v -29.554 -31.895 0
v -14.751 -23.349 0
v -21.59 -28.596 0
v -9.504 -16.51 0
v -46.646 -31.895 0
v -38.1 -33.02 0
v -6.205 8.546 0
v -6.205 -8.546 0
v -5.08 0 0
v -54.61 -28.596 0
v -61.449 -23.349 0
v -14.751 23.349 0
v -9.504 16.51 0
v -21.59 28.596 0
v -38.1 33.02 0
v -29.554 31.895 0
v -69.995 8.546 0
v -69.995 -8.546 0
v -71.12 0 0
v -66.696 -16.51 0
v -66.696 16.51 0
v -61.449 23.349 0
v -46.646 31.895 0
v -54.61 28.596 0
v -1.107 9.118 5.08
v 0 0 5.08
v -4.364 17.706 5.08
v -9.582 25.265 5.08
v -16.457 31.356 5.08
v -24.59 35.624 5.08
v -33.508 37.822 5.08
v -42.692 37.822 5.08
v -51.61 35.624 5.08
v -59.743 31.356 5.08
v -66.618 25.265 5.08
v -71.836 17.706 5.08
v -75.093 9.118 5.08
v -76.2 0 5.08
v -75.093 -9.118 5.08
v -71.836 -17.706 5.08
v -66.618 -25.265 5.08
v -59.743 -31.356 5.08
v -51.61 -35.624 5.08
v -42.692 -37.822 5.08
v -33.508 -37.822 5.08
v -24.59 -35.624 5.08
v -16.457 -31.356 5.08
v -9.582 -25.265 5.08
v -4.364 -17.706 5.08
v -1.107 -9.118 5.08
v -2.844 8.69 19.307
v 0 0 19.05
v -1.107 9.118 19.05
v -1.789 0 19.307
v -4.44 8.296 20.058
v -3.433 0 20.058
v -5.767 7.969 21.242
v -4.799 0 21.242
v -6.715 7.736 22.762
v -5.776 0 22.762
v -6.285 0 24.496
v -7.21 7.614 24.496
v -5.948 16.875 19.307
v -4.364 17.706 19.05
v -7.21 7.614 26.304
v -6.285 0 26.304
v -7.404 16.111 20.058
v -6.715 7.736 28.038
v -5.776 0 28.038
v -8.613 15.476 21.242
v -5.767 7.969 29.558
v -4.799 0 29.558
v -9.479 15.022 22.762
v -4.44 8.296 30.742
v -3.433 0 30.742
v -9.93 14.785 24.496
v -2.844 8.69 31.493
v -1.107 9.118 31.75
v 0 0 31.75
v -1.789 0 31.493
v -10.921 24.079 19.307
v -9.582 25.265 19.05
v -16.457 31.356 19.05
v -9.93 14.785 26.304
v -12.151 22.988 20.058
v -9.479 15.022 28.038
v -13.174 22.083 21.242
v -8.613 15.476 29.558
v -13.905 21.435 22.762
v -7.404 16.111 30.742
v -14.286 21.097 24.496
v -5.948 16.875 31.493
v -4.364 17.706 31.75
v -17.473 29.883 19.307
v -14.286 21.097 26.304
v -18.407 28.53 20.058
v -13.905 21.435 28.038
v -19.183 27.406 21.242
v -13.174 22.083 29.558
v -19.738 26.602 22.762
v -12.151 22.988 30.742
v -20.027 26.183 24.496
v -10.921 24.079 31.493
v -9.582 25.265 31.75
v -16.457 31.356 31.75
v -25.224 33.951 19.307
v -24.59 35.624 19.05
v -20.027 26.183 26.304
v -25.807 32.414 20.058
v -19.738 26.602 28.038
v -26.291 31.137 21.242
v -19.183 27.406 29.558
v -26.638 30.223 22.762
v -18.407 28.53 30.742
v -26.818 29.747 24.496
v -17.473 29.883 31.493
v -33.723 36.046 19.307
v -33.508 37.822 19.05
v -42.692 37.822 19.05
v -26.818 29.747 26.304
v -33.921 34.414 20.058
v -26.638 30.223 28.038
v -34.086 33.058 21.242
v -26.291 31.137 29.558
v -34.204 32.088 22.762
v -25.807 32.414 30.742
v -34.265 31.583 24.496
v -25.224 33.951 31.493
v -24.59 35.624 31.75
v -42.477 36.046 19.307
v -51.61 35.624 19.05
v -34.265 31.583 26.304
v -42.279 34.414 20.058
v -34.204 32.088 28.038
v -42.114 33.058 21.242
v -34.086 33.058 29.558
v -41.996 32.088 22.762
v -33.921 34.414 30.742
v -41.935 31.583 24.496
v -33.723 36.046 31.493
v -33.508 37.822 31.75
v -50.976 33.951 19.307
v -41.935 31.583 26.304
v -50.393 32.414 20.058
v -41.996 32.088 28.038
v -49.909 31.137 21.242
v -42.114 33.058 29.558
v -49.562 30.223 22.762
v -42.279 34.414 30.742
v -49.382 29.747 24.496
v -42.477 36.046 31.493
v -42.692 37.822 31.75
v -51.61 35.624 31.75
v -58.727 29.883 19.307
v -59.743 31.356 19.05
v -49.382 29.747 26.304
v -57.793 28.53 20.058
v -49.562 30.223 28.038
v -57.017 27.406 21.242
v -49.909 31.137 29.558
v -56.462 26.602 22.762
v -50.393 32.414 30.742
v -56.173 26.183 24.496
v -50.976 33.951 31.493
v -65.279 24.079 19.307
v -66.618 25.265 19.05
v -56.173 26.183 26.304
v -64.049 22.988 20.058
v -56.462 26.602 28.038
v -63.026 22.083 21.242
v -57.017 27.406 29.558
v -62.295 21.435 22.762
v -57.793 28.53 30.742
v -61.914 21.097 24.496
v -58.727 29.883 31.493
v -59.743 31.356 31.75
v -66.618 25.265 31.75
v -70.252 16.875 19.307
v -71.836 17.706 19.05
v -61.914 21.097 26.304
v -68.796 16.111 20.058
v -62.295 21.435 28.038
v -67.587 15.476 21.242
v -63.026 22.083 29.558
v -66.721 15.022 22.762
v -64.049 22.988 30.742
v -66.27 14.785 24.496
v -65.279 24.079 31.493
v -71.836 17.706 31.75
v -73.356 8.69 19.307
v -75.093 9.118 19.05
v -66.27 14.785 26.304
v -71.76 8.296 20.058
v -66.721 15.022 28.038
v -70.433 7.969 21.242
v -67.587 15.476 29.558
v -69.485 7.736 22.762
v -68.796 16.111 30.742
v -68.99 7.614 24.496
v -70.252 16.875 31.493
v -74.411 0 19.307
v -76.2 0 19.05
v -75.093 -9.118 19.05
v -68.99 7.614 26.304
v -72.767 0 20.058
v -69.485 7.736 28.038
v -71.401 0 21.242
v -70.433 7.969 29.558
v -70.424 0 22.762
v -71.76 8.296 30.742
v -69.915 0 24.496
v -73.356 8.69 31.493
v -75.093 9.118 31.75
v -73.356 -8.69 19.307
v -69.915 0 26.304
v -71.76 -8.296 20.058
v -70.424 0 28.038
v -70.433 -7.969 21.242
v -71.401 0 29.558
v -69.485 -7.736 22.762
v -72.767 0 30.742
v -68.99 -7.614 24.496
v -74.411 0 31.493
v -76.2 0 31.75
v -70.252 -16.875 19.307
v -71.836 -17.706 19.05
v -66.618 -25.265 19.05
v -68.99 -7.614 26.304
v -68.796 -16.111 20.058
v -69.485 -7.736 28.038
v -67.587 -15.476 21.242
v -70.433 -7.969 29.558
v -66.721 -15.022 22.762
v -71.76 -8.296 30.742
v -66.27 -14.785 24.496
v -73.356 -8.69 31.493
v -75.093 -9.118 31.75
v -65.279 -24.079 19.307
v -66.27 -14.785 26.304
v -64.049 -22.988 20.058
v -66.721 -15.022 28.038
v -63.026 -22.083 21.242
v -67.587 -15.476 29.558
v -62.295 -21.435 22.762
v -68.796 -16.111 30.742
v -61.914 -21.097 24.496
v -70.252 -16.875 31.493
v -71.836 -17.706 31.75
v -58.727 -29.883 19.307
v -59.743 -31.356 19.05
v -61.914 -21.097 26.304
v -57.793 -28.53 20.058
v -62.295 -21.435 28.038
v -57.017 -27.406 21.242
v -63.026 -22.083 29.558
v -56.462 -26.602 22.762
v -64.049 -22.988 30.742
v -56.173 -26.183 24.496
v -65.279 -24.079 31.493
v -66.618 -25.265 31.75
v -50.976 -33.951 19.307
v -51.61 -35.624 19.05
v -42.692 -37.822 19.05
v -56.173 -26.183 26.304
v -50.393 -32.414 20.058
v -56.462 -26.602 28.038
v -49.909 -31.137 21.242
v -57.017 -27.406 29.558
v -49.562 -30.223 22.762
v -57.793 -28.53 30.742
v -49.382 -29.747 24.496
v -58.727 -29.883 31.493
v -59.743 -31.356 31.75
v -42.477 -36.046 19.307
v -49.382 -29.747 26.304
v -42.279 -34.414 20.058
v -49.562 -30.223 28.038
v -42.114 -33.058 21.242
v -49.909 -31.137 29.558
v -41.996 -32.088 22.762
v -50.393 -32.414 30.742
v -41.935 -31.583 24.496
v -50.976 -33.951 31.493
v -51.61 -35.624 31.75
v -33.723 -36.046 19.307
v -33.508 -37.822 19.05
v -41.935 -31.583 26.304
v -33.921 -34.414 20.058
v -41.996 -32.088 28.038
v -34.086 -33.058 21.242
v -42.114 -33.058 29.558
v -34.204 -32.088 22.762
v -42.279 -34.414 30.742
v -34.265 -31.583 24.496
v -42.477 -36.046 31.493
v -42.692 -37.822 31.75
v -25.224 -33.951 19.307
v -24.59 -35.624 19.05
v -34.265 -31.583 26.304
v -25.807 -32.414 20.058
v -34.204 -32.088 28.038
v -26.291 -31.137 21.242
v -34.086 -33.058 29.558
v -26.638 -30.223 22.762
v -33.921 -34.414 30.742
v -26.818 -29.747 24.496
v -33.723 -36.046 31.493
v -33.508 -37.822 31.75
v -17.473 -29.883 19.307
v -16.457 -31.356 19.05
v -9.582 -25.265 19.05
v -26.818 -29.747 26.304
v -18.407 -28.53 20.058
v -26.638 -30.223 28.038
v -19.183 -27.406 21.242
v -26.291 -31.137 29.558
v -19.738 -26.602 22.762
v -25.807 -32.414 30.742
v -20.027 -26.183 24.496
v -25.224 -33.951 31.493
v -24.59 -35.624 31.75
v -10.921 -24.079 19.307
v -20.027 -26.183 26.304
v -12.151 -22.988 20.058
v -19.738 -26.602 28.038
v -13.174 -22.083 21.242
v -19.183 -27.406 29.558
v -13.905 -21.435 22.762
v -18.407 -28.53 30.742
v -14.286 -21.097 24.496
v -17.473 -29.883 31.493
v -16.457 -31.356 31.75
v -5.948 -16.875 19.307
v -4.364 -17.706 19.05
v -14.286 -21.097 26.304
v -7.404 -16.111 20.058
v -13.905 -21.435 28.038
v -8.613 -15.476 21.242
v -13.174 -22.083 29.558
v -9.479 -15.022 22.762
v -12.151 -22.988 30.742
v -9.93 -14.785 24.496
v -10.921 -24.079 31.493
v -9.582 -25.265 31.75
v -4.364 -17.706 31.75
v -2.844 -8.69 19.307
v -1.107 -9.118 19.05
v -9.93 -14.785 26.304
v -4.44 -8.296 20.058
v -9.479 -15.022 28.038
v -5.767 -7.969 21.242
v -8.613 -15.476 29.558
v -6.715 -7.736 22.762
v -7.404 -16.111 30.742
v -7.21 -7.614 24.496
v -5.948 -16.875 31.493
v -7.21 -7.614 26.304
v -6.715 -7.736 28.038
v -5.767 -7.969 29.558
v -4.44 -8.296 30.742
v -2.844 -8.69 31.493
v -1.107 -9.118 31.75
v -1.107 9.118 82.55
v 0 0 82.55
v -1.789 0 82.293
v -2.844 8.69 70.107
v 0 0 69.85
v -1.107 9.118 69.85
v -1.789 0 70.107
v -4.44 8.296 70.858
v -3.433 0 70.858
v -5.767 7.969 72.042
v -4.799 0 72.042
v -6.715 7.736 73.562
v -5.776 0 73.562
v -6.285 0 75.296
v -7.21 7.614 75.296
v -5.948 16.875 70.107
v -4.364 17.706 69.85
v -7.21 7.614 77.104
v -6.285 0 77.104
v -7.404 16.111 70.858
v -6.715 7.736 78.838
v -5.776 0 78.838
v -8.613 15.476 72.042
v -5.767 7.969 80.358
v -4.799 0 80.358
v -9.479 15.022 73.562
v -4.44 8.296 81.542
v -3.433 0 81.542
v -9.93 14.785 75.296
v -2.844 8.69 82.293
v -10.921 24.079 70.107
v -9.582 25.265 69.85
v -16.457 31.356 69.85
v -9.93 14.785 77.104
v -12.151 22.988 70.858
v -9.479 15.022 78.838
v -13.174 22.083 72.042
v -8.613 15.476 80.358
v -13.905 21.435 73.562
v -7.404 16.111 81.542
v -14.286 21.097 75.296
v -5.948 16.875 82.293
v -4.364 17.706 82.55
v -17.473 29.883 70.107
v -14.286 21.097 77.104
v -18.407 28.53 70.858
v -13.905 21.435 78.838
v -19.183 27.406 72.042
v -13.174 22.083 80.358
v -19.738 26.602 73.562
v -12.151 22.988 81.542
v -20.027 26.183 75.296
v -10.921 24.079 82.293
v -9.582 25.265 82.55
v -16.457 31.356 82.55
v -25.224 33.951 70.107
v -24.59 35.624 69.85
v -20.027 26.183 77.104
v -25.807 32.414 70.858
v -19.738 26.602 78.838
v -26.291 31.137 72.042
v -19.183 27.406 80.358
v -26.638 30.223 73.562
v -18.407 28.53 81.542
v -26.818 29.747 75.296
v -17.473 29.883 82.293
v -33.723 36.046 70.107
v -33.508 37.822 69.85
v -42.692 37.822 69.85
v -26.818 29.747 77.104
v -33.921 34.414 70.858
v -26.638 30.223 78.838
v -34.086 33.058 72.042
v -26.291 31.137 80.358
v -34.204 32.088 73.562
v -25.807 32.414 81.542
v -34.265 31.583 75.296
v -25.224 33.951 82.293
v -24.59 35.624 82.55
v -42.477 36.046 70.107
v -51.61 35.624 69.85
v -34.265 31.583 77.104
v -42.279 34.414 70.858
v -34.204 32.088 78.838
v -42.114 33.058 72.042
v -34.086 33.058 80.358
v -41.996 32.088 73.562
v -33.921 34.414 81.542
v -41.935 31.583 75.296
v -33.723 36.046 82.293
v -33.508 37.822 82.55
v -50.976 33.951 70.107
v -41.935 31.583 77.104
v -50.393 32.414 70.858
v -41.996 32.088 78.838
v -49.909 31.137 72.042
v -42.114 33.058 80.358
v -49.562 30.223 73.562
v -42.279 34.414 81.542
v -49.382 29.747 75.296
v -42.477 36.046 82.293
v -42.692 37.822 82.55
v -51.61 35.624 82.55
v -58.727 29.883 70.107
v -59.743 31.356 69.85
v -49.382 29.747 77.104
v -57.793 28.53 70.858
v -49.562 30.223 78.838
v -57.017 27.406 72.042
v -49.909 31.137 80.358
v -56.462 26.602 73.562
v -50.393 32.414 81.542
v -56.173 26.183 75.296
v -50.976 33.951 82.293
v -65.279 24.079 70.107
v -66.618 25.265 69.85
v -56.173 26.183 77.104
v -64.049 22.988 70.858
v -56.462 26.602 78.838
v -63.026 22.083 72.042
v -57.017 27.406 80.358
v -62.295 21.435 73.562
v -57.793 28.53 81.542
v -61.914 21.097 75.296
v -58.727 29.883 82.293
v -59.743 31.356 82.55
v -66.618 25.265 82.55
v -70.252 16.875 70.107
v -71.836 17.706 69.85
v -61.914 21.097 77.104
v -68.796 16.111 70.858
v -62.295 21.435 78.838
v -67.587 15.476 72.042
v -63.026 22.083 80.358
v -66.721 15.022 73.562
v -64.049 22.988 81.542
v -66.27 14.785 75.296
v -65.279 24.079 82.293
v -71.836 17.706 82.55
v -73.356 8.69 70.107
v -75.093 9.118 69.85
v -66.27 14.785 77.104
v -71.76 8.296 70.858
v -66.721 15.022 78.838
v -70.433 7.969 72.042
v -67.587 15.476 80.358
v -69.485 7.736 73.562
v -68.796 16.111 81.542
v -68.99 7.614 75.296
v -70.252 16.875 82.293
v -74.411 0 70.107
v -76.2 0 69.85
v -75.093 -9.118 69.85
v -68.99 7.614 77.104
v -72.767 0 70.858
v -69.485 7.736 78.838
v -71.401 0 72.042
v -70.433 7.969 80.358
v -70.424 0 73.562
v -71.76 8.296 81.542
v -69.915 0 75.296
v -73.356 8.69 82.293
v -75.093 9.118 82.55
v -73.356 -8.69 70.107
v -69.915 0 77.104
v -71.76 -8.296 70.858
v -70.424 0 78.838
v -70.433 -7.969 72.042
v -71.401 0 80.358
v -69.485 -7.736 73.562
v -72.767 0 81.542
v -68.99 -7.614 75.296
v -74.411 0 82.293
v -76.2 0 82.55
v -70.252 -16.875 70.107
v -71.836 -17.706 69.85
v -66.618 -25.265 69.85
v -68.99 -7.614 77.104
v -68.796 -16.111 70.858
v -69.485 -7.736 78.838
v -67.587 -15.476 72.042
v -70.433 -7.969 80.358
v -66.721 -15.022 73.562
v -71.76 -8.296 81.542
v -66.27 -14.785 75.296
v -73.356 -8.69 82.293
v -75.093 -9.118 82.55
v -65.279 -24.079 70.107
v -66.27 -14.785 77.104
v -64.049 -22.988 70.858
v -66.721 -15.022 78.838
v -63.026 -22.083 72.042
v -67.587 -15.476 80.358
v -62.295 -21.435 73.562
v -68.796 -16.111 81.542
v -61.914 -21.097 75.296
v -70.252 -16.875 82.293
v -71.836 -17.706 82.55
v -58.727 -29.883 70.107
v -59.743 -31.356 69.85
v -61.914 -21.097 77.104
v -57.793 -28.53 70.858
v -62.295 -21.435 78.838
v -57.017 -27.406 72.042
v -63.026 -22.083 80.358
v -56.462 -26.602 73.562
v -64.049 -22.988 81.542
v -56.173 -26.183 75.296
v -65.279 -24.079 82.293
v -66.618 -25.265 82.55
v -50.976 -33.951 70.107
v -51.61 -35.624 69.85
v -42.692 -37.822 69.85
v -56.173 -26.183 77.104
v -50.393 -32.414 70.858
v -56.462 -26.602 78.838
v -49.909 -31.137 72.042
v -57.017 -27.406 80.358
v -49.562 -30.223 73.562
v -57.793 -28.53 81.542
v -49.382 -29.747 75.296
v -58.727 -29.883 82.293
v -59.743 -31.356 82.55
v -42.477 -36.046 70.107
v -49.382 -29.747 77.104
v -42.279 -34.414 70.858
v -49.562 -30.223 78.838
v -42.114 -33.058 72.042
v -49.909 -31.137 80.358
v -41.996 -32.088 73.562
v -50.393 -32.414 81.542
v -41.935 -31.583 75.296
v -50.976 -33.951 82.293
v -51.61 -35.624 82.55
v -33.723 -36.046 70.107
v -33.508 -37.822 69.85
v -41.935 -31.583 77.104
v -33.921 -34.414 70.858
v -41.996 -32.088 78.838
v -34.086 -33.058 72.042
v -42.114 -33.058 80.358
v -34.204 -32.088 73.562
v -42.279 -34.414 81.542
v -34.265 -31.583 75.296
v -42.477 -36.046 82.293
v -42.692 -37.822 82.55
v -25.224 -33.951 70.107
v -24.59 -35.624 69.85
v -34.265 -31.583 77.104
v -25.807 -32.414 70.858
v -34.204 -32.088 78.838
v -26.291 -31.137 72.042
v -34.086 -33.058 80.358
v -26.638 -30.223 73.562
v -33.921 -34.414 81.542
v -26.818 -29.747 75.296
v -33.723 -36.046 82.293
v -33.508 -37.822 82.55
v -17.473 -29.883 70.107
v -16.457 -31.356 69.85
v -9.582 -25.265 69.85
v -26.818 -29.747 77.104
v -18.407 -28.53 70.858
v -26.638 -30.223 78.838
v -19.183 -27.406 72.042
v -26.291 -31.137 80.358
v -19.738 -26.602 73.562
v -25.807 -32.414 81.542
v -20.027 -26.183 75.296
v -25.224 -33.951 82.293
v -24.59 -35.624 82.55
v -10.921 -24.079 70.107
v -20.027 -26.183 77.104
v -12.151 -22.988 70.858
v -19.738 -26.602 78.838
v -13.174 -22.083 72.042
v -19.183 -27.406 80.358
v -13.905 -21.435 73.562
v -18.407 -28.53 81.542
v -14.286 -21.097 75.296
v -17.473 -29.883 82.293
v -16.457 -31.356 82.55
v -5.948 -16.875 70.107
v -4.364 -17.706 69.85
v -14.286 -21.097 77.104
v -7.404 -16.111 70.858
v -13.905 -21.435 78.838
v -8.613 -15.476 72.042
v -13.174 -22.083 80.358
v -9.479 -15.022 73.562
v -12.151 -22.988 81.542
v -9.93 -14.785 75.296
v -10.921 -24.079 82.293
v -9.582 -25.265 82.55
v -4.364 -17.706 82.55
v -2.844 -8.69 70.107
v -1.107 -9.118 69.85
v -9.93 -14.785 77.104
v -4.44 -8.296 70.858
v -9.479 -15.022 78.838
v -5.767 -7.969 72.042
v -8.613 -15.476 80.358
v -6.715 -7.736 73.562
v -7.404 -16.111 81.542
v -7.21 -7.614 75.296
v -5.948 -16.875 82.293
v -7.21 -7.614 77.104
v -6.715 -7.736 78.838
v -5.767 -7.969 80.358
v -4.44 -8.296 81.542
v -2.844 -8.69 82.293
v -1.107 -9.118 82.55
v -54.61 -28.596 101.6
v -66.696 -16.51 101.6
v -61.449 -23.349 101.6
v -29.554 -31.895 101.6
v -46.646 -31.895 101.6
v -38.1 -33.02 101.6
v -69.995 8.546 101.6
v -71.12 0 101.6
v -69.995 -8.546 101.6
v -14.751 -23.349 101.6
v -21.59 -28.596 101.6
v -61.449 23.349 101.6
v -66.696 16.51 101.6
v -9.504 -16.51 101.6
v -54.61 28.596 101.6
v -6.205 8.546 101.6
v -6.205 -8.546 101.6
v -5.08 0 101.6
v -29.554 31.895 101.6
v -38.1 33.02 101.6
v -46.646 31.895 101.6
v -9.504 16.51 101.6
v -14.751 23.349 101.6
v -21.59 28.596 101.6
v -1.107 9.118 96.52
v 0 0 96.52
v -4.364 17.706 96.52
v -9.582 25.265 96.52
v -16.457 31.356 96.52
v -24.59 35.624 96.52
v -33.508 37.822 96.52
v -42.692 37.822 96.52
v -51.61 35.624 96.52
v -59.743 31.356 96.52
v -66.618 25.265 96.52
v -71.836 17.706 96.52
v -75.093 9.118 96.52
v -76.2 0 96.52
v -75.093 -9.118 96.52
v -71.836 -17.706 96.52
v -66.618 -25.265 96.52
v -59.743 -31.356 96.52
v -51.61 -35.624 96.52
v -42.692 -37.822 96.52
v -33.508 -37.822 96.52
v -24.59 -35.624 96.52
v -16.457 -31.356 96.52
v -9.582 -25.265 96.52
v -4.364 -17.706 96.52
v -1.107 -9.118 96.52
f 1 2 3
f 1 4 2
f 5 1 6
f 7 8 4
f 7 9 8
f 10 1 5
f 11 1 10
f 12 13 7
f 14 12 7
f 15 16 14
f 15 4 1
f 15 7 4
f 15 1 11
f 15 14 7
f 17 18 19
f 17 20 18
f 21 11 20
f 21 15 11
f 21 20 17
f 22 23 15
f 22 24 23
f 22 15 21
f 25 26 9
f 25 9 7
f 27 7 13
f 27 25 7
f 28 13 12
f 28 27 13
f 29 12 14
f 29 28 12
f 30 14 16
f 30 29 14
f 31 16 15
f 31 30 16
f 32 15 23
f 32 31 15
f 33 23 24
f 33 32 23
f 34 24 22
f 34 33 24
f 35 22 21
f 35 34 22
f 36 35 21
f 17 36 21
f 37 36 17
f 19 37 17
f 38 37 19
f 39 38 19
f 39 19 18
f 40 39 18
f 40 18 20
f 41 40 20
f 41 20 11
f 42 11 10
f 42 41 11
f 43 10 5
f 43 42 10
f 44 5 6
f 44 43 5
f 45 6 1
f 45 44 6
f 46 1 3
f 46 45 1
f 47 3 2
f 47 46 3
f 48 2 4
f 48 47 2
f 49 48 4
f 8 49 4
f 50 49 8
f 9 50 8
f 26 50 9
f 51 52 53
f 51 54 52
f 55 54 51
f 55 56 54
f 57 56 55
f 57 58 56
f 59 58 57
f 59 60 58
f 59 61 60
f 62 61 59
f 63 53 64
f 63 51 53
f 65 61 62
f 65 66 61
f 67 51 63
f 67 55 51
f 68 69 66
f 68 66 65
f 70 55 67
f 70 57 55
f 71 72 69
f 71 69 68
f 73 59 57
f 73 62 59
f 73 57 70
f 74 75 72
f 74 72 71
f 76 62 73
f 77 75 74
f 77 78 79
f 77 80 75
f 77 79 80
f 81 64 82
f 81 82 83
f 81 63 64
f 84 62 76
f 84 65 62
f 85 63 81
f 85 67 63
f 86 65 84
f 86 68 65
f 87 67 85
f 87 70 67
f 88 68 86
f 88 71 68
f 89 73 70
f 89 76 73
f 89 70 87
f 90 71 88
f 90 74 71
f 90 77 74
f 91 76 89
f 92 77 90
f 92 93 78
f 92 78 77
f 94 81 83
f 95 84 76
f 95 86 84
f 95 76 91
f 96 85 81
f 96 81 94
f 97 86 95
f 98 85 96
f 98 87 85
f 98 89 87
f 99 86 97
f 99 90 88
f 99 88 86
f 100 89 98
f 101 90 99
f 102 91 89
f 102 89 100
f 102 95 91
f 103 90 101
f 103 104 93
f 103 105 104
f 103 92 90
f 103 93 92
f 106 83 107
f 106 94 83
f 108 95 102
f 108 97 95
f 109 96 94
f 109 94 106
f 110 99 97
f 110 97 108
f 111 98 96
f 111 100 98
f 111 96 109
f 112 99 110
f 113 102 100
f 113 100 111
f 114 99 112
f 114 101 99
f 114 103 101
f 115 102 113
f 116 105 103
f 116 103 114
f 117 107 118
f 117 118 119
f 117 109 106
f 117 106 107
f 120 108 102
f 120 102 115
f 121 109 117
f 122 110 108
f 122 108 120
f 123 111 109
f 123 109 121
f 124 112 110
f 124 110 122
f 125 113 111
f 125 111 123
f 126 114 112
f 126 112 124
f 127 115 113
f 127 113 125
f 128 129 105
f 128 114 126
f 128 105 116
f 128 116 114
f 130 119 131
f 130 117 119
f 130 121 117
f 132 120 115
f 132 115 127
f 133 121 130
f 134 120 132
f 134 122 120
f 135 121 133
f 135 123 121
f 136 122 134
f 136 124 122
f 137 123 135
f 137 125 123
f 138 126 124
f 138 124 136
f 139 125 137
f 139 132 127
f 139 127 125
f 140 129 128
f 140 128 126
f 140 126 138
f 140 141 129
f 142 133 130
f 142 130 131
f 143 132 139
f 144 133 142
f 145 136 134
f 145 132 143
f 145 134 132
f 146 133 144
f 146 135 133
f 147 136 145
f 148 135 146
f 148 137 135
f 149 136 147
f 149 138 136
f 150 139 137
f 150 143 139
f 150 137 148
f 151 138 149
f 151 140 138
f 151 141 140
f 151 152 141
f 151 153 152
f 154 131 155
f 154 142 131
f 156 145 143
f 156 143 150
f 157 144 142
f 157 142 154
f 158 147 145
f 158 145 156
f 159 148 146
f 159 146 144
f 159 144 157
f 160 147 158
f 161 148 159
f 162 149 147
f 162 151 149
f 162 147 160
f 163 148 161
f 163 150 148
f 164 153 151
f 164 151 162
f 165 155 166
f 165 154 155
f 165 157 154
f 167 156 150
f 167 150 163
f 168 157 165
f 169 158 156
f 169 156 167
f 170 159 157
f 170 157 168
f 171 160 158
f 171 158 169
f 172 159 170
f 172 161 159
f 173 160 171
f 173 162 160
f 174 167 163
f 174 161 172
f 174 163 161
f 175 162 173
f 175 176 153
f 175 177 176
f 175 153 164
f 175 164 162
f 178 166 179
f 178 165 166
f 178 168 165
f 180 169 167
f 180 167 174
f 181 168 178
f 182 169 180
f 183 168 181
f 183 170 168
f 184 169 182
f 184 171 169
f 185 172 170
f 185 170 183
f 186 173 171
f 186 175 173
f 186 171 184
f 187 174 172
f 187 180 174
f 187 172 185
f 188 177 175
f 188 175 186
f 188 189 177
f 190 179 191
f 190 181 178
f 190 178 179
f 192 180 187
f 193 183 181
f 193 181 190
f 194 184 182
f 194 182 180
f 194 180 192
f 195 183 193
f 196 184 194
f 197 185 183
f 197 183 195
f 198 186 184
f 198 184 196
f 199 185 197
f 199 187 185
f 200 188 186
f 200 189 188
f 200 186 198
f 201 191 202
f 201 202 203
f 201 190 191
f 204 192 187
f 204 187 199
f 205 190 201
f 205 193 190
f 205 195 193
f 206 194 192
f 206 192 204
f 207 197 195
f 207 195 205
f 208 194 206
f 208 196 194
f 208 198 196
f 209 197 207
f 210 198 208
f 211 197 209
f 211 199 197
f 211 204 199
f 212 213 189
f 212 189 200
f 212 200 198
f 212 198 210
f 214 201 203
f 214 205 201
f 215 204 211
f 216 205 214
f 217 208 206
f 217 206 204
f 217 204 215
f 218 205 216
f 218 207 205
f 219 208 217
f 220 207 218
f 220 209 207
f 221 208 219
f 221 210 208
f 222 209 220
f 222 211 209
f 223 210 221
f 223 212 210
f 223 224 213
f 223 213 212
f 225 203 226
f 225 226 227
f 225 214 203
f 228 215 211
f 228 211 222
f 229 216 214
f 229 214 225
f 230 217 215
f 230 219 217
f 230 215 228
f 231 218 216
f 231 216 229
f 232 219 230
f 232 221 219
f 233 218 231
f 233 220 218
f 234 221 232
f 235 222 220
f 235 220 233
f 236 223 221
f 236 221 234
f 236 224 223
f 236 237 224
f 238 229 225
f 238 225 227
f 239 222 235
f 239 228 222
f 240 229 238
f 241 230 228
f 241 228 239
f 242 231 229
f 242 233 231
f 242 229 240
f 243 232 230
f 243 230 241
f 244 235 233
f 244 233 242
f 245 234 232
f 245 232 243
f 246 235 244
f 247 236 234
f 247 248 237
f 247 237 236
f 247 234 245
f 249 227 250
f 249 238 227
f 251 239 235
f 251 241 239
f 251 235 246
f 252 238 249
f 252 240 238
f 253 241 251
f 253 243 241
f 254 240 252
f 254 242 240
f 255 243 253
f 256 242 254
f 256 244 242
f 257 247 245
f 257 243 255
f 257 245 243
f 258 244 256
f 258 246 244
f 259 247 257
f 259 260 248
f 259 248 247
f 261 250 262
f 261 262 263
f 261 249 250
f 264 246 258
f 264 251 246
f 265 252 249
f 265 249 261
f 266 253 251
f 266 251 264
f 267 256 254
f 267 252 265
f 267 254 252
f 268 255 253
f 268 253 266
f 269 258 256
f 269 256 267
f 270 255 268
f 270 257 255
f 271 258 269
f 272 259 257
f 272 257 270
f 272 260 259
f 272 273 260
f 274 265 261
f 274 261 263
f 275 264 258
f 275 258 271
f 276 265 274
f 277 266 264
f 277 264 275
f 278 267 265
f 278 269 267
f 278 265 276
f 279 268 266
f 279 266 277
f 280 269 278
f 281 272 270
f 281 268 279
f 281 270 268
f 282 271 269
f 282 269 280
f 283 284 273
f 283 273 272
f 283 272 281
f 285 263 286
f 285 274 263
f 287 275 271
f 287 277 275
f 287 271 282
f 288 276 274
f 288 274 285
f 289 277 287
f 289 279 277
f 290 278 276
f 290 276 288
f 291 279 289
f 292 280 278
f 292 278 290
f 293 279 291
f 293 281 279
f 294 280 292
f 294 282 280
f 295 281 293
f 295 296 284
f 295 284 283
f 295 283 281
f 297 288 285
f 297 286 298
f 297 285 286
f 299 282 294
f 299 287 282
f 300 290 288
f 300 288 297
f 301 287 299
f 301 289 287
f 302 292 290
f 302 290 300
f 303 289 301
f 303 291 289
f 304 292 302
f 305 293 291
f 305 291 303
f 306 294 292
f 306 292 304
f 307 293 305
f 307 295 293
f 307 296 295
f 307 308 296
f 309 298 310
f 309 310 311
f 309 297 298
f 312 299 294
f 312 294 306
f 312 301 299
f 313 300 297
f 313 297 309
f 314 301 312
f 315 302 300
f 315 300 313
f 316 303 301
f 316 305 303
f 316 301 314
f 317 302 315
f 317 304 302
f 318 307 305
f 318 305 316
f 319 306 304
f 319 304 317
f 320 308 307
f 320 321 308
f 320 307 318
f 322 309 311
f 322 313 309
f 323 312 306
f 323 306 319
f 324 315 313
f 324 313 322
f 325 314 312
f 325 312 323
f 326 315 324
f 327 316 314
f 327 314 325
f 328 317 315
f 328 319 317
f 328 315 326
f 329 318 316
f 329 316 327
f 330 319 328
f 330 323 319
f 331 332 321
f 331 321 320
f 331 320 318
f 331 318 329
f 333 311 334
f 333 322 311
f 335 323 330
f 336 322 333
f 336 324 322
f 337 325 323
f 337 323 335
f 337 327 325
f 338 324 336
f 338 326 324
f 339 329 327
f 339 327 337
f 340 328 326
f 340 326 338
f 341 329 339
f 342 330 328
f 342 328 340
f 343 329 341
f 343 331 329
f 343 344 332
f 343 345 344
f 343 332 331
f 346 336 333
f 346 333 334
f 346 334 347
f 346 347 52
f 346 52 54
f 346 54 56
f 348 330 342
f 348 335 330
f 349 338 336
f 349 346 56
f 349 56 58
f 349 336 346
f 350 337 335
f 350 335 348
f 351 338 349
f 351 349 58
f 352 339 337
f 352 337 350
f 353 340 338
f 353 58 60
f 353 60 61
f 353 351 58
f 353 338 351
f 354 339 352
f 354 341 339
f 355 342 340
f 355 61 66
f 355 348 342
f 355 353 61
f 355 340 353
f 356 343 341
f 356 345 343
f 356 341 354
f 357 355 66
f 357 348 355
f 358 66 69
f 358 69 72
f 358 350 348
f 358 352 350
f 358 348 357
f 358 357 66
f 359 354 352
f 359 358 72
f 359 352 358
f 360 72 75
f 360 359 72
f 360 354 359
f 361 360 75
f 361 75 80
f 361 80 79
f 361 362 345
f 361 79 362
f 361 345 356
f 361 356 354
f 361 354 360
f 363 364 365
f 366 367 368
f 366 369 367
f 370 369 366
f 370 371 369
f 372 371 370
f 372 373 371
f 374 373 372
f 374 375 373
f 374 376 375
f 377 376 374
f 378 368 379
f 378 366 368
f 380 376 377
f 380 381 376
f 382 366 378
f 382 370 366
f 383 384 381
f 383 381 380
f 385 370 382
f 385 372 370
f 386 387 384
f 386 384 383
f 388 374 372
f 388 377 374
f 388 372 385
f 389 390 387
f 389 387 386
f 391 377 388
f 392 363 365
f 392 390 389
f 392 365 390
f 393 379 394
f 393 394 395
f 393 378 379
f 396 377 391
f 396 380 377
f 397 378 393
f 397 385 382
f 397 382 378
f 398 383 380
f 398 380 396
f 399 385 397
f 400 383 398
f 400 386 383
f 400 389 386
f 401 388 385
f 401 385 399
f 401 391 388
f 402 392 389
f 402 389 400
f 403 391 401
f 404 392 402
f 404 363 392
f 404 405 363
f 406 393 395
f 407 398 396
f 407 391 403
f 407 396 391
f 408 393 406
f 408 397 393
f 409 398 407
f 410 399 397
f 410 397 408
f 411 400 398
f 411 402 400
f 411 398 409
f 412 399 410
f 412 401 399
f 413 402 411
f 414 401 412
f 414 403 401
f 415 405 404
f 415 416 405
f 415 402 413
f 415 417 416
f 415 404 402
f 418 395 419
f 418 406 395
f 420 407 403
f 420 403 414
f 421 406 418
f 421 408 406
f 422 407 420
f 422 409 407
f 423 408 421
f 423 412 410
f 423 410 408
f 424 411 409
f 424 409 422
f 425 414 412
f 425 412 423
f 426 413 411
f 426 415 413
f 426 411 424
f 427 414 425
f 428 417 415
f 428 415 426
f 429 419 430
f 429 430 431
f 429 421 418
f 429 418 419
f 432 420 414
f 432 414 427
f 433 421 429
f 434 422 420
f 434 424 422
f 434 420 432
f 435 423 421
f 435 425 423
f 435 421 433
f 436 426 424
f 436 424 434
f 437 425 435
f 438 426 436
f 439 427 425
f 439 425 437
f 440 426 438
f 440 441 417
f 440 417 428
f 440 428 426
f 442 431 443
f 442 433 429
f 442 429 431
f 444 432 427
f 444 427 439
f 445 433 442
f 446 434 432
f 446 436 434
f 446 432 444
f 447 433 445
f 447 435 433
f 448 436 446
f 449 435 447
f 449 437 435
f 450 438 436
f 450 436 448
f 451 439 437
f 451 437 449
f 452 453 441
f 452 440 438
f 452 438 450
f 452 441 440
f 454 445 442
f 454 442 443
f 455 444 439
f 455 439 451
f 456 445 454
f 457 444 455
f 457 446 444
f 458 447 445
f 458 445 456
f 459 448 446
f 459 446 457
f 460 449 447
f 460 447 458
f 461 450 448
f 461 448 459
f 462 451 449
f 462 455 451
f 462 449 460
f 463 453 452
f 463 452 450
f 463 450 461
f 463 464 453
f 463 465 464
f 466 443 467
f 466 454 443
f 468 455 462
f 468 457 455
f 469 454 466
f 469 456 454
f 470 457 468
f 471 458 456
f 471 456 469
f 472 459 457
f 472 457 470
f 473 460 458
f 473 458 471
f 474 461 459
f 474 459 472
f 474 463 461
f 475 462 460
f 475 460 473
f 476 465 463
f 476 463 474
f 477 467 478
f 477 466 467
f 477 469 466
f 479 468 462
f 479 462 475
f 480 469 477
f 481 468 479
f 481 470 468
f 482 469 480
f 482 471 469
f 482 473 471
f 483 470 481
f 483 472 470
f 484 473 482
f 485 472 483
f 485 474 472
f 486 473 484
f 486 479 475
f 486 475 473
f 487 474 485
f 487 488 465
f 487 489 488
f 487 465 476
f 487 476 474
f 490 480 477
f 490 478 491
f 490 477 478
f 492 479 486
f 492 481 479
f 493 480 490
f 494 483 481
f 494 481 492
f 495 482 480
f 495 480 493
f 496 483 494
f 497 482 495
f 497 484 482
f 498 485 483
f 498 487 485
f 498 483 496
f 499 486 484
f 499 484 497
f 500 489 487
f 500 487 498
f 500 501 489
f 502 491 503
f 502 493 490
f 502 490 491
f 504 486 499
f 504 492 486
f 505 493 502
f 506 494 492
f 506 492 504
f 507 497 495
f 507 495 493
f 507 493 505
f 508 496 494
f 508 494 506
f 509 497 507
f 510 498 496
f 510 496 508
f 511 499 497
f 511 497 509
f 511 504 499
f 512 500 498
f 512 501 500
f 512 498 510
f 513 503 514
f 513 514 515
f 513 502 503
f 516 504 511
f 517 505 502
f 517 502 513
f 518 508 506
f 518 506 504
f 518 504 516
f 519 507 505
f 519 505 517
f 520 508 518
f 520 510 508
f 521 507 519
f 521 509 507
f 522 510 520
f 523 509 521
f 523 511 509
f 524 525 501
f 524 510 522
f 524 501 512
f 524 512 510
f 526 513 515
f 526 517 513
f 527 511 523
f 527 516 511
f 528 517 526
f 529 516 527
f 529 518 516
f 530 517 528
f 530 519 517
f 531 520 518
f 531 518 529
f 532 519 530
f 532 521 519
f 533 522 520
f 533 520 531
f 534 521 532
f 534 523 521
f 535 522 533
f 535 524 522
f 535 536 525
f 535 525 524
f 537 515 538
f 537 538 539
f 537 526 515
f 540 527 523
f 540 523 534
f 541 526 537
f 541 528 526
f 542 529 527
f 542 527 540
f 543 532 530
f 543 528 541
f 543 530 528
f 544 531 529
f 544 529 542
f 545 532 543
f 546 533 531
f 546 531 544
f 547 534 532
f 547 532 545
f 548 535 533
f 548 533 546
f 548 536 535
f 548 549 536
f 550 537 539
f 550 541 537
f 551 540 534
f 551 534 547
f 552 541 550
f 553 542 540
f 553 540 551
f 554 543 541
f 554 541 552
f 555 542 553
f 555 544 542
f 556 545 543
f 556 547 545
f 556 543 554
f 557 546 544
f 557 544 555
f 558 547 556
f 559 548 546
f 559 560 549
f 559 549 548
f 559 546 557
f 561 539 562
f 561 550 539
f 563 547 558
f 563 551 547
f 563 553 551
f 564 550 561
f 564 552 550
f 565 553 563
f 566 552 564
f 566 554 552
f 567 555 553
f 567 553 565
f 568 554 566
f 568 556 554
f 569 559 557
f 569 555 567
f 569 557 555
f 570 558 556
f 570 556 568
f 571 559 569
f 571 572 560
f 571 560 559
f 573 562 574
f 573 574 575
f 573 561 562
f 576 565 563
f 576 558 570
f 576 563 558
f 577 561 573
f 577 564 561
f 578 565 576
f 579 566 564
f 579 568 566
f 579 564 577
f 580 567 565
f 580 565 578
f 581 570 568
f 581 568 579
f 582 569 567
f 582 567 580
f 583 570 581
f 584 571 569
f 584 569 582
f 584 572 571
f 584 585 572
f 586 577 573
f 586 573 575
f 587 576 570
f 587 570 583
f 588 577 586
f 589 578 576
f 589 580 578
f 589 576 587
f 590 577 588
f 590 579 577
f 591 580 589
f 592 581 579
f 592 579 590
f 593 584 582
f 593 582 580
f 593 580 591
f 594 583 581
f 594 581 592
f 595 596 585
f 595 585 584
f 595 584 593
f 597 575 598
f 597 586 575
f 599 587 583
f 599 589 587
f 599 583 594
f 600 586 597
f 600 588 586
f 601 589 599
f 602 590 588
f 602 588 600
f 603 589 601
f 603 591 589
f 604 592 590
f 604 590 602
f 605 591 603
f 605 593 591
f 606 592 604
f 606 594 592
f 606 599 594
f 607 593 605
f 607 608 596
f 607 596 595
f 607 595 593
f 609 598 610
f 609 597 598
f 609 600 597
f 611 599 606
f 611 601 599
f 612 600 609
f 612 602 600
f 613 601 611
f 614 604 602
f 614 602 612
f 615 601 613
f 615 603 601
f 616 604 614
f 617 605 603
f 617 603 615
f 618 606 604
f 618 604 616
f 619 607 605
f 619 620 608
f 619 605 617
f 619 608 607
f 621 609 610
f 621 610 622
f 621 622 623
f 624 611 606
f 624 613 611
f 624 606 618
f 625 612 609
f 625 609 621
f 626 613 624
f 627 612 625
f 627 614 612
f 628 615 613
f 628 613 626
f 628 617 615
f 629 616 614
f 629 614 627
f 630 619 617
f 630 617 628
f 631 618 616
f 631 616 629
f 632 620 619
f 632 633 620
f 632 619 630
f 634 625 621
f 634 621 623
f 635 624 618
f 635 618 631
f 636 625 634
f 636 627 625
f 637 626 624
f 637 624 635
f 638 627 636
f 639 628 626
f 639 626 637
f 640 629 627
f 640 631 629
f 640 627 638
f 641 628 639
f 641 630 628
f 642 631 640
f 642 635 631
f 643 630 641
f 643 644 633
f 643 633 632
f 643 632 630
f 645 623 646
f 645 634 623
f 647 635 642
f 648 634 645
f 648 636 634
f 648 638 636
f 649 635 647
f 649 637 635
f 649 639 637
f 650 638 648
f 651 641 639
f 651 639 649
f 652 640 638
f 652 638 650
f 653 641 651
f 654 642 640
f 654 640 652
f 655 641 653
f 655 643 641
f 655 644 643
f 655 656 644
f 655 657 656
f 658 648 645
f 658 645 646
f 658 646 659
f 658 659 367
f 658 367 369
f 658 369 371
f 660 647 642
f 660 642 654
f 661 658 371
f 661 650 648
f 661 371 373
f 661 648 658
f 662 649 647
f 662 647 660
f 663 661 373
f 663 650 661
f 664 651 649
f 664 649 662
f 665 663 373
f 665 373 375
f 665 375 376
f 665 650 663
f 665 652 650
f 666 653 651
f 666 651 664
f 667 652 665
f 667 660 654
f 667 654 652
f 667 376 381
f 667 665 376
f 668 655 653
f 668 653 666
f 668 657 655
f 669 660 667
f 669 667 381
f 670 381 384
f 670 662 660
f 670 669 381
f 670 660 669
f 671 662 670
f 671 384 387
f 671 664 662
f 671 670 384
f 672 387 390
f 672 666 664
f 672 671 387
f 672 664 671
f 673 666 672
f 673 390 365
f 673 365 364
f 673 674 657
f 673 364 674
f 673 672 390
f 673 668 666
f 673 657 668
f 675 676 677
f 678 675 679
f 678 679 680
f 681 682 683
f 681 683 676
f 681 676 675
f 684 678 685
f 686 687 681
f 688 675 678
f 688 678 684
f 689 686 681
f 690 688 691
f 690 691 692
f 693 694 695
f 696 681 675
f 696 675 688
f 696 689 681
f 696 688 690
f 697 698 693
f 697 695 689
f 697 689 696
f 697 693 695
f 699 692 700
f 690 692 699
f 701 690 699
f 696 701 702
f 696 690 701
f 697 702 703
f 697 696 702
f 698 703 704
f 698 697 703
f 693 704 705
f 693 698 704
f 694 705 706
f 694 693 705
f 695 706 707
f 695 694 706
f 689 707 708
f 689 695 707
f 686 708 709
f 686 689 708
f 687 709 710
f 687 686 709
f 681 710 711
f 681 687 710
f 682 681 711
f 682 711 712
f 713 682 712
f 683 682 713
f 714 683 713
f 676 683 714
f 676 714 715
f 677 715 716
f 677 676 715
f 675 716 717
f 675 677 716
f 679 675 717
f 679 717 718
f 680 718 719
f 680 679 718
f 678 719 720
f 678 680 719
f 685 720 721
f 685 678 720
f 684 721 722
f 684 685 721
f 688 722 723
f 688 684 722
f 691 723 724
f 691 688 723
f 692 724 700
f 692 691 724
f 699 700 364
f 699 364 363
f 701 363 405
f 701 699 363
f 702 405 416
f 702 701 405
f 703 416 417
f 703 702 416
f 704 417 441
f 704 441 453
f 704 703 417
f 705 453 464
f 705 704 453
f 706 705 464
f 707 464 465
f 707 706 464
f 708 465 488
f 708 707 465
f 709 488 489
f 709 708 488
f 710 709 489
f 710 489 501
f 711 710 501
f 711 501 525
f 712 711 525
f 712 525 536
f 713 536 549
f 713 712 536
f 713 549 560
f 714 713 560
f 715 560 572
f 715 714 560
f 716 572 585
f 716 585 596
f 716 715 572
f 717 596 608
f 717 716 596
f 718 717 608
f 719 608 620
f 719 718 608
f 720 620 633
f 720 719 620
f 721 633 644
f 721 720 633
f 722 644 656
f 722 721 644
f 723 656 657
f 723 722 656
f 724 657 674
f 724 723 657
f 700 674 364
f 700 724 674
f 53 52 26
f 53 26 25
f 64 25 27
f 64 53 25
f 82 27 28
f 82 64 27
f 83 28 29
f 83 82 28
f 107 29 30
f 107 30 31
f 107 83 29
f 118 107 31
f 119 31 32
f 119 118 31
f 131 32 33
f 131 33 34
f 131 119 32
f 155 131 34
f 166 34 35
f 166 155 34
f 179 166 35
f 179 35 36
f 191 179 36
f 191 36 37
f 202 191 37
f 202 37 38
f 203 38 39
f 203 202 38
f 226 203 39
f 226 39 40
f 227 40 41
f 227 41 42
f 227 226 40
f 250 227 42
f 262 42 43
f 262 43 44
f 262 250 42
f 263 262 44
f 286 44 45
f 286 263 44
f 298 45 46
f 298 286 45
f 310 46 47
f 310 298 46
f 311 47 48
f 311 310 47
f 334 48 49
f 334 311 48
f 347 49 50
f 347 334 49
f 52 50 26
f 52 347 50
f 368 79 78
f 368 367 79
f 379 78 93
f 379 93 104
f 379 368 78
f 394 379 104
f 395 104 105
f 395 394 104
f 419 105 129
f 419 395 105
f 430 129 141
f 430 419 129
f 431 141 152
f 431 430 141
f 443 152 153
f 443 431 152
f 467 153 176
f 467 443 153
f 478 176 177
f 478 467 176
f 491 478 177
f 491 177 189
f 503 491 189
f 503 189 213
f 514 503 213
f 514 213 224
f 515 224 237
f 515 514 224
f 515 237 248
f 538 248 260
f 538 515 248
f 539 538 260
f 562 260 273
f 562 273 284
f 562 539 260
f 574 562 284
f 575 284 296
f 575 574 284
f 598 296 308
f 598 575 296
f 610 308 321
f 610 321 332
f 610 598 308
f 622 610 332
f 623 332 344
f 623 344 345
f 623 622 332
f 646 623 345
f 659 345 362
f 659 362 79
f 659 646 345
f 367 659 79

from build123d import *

# Parameters (mm, degrees)
F2_SIZE = 5.08
F3_SIZE = 5.08


with BuildPart() as f1:
    # F0 (on Front) → F1 (revolve)
    with BuildSketch(Plane.XZ):
        with BuildLine():
            Line((-38.1, 0), (0, 0))
            Line((0, 0), (0, 19.05))
            ThreePointArc((0, 19.05), (-6.35, 25.4), (0, 31.75))
            Line((0, 31.75), (0, 69.85))
            ThreePointArc((0, 69.85), (-6.35, 76.2), (0, 82.55))
            Line((0, 82.55), (0, 101.6))
            Line((0, 101.6), (-38.1, 101.6))
            Line((-38.1, 101.6), (-38.1, 0))
        make_face()
    revolve(axis=Axis((-38.1, 0, 50.8), (0, 0, 1)))

    # F2
    f2_edges = [f1.edges().sort_by_distance(p)[0] for p in [
        (-76.2, 0, 0),
    ]]
    chamfer(f2_edges, length=F2_SIZE)

    # F3
    f3_edges = [f1.edges().sort_by_distance(p)[0] for p in [
        (-76.2, 0, 101.6),
    ]]
    chamfer(f3_edges, length=F3_SIZE)


solid = f1.part
